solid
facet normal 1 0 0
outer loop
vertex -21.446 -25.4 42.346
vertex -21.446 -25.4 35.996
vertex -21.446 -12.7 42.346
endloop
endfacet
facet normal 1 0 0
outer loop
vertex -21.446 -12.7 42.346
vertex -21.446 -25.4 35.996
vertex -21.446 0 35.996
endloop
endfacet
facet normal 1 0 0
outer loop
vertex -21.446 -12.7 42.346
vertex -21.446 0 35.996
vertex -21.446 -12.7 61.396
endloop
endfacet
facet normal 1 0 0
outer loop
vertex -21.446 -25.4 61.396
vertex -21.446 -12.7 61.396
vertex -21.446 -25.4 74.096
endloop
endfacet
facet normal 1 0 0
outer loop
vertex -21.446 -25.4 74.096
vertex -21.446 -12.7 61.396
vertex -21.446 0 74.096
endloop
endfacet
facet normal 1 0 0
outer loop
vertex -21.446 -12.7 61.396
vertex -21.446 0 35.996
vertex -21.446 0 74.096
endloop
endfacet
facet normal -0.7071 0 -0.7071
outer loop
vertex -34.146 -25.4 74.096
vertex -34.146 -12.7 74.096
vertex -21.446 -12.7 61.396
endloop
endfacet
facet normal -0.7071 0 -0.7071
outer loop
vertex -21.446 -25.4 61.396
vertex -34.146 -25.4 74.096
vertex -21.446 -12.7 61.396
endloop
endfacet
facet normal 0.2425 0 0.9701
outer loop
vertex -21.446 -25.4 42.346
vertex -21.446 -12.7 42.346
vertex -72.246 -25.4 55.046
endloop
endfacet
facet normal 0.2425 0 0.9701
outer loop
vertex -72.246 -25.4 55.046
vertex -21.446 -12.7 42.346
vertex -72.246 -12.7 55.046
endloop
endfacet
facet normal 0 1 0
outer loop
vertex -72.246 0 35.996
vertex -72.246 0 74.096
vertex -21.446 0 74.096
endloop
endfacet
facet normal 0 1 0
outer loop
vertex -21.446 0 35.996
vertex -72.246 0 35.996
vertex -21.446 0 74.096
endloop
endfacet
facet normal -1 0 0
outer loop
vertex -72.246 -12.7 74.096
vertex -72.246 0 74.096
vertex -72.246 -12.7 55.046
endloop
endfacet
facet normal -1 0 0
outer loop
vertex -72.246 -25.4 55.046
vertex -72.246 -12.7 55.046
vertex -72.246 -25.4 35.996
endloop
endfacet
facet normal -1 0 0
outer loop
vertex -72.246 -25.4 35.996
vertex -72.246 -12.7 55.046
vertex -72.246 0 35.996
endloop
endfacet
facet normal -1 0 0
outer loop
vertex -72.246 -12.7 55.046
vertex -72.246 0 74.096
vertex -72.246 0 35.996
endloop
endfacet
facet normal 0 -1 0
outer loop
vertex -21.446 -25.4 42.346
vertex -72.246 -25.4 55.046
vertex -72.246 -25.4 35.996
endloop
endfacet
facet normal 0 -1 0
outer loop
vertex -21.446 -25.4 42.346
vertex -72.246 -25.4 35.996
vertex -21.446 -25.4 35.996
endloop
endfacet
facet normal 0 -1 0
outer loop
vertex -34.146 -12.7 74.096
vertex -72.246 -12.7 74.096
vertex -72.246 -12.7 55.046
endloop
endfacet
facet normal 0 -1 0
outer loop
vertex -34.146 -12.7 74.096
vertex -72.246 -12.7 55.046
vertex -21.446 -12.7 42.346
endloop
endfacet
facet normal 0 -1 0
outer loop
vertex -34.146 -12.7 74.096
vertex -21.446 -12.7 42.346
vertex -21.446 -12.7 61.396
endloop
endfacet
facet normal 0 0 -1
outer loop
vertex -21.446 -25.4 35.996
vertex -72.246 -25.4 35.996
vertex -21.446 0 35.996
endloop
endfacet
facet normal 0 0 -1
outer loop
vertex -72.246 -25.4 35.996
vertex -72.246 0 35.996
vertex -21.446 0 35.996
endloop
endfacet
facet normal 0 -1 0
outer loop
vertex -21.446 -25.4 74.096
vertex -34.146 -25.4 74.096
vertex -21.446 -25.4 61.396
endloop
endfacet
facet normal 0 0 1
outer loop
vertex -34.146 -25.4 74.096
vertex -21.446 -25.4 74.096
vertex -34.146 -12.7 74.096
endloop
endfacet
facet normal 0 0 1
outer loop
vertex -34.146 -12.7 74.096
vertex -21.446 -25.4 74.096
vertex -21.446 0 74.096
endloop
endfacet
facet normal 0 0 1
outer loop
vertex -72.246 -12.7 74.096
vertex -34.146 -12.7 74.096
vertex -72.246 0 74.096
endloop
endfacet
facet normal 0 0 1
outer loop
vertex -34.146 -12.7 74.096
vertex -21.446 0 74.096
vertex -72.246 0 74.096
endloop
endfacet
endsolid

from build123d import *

# Parameters (mm, degrees)
F0_W     = 50.8
F0_H     = 38.1
F1_DEPTH = 12.7
F3_DEPTH = 12.7
F5_DEPTH = 12.7


with BuildPart() as f1:
    # F0 (on Front) → F1 (new body)
    with BuildSketch(Plane.XZ):
        with Locations((-46.846292, 55.045669)):
            Rectangle(F0_W, F0_H)
    extrude(amount=F1_DEPTH)

    # F2 (on face) → F3 (join)
    with BuildSketch(Plane.XZ.offset(12.7)):
        Polygon((-21.446292, 42.345669), (-72.246292, 55.045669), (-72.246292, 35.995669), (-21.446292, 35.995669), align=None)
    extrude(amount=F3_DEPTH)

    # F4 (on face) → F5 (join)
    with BuildSketch(Plane.XZ.offset(12.7)):
        Polygon((-34.146292, 74.095669), (-21.446292, 61.395669), (-21.446292, 74.095669), align=None)
    extrude(amount=F5_DEPTH)


solid = f1.part
